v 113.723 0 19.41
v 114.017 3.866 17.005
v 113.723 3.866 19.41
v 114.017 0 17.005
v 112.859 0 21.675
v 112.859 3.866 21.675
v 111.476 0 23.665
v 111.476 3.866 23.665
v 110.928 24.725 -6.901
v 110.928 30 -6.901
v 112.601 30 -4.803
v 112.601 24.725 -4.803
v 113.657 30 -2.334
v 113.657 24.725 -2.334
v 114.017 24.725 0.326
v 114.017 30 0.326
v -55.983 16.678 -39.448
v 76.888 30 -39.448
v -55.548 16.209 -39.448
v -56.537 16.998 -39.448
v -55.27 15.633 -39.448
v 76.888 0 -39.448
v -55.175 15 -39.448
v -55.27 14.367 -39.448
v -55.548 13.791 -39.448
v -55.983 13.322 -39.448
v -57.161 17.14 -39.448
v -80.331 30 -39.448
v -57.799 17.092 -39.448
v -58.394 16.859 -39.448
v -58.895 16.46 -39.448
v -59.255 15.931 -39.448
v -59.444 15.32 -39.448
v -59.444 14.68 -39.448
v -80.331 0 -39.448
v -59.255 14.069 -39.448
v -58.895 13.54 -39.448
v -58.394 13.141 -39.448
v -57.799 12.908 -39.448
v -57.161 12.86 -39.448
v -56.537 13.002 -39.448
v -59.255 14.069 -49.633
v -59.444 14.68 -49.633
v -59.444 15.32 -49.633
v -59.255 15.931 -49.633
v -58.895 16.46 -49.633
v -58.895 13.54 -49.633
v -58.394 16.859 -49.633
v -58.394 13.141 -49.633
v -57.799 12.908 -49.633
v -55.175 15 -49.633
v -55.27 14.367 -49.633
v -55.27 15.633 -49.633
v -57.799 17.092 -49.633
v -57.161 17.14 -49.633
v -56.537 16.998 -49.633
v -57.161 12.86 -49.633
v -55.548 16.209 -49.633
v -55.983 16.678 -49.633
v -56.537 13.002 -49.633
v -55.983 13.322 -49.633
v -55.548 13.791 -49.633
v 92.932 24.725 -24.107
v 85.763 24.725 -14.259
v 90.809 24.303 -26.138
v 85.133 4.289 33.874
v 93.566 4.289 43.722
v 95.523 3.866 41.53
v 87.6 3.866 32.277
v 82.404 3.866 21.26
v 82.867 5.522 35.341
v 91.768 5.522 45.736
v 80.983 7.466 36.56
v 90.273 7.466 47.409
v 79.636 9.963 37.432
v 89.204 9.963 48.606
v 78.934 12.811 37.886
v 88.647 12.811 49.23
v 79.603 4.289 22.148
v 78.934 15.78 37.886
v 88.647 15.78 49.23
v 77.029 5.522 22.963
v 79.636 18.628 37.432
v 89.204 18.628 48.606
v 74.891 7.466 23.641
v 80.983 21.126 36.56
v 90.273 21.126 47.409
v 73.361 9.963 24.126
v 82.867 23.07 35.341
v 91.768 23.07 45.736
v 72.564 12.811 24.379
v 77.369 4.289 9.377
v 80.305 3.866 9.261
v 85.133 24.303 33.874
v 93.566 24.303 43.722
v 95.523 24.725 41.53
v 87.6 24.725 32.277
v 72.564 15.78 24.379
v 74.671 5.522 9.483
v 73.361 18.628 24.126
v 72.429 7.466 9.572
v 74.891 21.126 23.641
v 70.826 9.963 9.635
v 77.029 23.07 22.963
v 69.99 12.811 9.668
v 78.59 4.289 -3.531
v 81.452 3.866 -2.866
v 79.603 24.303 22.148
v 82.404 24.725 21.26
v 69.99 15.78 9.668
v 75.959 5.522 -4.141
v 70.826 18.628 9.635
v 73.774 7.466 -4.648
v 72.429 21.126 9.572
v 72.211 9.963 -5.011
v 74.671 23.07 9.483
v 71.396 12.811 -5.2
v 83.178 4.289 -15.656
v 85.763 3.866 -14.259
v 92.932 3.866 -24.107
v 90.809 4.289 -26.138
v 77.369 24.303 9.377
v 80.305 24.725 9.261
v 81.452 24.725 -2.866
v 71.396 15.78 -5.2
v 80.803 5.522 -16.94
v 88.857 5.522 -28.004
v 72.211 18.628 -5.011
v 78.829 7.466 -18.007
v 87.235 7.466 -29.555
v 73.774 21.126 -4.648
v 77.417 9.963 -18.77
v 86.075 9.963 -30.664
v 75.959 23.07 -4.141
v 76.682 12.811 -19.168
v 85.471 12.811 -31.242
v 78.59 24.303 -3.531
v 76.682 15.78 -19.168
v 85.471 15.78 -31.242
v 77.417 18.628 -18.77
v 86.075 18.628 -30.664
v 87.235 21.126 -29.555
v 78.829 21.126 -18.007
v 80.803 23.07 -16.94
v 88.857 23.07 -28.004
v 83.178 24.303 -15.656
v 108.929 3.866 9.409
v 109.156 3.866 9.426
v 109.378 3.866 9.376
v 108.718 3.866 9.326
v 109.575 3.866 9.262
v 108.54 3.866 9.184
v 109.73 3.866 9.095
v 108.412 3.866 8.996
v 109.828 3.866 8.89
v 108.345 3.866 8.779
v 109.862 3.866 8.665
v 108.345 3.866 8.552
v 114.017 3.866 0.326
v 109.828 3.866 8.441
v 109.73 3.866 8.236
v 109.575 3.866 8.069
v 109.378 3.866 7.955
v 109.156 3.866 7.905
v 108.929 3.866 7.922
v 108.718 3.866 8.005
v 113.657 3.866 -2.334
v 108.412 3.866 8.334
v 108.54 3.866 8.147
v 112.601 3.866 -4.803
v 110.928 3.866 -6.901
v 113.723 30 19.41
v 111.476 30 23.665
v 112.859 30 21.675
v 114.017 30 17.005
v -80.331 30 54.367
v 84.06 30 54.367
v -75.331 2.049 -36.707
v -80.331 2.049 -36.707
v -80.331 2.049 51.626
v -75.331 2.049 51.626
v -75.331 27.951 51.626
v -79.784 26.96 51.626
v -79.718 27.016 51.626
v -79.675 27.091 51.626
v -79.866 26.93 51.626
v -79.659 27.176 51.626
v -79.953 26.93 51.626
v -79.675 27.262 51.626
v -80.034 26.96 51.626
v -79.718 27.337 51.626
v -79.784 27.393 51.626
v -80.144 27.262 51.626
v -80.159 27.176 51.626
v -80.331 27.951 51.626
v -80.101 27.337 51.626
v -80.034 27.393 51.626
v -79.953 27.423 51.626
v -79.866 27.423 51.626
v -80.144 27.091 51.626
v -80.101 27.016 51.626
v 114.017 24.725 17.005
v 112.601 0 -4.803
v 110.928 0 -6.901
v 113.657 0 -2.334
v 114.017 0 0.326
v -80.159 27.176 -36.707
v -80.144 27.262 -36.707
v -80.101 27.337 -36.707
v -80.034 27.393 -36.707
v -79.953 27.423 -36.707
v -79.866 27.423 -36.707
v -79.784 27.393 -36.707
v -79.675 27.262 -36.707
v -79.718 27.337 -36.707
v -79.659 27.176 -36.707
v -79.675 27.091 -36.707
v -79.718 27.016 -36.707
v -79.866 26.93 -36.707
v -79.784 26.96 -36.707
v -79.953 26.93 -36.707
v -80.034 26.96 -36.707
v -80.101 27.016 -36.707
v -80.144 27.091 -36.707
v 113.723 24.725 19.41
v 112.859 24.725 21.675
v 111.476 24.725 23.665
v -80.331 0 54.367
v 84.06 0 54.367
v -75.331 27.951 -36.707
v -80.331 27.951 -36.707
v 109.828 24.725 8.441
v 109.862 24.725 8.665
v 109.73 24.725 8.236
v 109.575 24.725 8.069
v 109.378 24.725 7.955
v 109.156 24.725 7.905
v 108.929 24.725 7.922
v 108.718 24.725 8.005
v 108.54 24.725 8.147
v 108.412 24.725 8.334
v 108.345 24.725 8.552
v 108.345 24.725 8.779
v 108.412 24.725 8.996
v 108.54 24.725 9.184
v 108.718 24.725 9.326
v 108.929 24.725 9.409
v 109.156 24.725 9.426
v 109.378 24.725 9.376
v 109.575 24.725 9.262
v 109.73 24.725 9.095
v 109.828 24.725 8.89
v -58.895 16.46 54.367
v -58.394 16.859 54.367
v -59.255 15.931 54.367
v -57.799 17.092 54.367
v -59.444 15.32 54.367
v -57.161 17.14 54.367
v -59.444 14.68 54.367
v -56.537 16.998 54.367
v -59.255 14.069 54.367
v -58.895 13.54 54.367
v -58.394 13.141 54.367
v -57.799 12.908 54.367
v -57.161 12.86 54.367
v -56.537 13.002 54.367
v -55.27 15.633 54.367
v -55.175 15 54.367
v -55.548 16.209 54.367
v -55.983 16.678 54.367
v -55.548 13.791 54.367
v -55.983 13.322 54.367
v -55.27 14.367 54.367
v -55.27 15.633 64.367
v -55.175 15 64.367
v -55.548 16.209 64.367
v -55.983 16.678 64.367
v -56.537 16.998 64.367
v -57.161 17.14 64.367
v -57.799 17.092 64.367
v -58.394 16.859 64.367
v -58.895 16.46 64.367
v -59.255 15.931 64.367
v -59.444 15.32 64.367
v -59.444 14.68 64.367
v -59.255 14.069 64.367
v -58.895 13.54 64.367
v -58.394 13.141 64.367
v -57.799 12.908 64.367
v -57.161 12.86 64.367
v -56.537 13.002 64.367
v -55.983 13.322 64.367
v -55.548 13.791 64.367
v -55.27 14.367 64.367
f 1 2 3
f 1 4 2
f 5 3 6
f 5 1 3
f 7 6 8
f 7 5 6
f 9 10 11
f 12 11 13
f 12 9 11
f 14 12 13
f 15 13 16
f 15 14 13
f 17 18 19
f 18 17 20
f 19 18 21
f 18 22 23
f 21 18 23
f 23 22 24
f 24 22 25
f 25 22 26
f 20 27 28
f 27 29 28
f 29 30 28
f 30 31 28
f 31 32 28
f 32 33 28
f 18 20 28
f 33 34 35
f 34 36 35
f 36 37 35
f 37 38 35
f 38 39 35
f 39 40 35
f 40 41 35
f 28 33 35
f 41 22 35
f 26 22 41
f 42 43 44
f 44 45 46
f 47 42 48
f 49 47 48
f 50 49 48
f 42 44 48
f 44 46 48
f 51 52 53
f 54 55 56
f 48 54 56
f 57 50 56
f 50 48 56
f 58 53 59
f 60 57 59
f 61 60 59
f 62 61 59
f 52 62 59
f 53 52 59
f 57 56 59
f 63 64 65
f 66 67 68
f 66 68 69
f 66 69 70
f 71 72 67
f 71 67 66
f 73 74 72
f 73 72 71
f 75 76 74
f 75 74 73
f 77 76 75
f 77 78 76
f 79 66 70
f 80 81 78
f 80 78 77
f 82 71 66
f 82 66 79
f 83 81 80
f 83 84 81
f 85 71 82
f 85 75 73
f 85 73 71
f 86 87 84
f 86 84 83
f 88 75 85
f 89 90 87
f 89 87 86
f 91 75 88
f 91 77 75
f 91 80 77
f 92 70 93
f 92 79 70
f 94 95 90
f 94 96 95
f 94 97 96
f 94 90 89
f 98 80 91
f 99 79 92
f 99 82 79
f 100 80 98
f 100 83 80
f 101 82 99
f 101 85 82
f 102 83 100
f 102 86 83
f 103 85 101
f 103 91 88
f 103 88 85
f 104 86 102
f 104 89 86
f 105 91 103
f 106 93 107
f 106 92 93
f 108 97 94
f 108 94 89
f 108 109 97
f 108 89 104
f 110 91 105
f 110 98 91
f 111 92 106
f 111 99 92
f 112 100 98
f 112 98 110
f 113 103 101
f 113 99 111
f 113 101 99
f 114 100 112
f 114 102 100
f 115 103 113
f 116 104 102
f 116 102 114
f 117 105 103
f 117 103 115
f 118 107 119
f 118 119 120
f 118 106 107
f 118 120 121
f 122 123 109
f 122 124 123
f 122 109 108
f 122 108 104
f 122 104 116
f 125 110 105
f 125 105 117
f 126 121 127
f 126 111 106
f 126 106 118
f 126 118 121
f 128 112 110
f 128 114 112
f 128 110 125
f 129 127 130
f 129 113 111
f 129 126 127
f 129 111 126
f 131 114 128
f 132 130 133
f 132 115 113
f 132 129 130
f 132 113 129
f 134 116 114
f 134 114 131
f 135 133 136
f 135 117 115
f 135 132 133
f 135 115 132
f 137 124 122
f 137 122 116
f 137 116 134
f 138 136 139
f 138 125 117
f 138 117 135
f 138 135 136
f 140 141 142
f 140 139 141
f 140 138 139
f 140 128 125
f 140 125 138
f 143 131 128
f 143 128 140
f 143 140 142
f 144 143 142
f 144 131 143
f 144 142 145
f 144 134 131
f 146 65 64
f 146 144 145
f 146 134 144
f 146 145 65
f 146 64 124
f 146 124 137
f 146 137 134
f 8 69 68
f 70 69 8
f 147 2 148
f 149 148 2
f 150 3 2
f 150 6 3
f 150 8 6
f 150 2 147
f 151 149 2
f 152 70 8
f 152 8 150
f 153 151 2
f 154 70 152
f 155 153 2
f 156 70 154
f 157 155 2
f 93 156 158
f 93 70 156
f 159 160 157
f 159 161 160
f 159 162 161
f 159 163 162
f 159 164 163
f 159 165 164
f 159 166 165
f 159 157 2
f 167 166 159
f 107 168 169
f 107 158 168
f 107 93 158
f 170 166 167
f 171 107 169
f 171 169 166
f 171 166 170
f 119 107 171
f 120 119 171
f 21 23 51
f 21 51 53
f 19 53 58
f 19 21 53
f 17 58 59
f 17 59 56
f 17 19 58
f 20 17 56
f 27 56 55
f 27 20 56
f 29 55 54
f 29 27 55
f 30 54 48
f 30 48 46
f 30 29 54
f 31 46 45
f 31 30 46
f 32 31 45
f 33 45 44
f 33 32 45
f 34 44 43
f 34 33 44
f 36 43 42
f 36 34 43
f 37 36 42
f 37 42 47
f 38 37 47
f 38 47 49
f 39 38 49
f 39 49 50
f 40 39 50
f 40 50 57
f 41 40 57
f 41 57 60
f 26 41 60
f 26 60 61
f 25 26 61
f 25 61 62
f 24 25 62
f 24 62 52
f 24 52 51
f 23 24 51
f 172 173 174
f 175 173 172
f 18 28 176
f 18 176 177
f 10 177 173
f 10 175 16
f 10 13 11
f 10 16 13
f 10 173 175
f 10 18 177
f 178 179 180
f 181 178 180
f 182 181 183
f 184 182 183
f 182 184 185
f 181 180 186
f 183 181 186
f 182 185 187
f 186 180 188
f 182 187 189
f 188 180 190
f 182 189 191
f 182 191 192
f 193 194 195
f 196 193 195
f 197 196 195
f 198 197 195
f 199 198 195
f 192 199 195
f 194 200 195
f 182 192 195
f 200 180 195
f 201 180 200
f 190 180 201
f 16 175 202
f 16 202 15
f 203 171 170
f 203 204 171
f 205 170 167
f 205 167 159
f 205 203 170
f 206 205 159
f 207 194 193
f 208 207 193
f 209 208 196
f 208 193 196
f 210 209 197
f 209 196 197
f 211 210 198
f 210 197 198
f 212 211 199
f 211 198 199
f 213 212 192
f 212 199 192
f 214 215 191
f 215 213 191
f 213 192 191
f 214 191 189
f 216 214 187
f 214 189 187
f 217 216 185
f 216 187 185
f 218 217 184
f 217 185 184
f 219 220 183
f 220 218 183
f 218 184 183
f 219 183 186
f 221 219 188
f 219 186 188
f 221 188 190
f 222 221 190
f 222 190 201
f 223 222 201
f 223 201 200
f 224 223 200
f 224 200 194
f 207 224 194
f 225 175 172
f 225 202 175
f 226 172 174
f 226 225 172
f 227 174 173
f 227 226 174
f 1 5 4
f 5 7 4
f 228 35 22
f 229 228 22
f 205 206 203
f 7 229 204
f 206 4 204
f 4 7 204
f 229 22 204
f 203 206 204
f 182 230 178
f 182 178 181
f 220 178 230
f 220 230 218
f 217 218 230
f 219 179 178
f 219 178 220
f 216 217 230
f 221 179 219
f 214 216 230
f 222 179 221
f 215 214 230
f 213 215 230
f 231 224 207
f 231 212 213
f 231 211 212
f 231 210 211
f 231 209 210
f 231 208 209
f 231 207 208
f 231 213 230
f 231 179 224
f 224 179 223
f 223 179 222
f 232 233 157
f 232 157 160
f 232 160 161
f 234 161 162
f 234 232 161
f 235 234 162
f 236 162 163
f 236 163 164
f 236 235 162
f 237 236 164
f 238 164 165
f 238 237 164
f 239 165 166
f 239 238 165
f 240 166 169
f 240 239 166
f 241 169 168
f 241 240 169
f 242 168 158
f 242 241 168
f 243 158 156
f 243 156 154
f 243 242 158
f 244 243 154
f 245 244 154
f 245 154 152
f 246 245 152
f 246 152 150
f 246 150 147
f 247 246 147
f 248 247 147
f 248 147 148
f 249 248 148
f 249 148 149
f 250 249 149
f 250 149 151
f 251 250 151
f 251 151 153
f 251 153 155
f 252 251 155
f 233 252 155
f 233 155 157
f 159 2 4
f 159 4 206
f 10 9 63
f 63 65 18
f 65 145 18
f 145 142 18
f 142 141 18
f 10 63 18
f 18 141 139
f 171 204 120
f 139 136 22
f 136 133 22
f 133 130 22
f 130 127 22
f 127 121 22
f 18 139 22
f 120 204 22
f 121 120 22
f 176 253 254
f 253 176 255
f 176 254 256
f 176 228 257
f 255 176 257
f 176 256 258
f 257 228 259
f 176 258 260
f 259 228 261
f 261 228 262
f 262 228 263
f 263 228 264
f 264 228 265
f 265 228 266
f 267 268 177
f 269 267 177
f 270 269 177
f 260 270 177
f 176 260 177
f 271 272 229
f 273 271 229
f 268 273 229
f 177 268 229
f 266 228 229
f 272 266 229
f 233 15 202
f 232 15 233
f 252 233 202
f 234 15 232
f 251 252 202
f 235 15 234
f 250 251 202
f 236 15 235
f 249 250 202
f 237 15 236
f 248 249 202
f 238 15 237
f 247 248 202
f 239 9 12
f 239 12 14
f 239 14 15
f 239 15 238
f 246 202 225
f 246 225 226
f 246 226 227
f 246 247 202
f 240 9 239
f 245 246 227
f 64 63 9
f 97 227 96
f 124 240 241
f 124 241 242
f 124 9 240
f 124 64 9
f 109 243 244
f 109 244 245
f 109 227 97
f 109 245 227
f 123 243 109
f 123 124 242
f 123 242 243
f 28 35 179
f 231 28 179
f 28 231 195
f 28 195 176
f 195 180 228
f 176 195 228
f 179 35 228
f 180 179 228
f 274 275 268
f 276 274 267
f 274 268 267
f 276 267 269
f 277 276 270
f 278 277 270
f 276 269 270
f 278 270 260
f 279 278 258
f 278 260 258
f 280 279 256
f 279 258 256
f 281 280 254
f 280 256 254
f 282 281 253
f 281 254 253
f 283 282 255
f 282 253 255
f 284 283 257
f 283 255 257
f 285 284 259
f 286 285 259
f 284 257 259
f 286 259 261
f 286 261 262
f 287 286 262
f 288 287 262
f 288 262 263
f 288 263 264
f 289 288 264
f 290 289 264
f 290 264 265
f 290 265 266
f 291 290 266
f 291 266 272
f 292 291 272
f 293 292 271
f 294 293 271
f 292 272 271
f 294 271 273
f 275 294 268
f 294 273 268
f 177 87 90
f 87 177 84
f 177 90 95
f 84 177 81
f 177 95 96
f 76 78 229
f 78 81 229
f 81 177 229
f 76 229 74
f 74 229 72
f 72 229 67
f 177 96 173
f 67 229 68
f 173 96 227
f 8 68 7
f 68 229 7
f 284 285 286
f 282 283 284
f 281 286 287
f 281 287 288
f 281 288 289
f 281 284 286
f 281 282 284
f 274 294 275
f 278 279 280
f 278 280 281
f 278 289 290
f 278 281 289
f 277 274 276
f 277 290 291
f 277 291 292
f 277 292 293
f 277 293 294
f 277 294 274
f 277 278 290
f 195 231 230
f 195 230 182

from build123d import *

# Parameters (mm, degrees)
BOSS_EXTRUDE1_DEPTH      = 30
SKETCH3_R                = 2.146244949
BOSS_EXTRUDE2_DEPTH      = 10
BOSS_EXTRUDE2_DEPTH_BACK = 104
SKETCH4_W                = 62.472603167
SKETCH4_H                = 24.76734243
CUT_EXTRUDE1_DEPTH       = 31
FILLET1_R                = 10
SKETCH5_R                = 0.76292284
BOSS_EXTRUDE3_DEPTH      = 30
SKETCH8_W                = 88.333137
SKETCH8_H                = 25.902143048
CUT_EXTRUDE2_DEPTH       = 5
SKETCH9_R                = 0.25
BOSS_EXTRUDE4_DEPTH      = 90


with BuildPart() as part:
    # Sketch1 → Boss-Extrude1 (new body)
    with BuildSketch(Plane(origin=(0, 0, 0), x_dir=(1, 0, 0), z_dir=(0, 1, 0))):
        Polygon((-80.330769327, 39.448145651), (-80.330769327, -54.366717098), (84.060412188, -54.366717098), (125.94717048, -7.459285723), (76.88802207, 39.448145651), align=None)
    extrude(amount=BOSS_EXTRUDE1_DEPTH)

    # Sketch2 → Cut-Revolve2 (revolve, cut)
    with BuildSketch(Plane(origin=(73.778167937, 0, 65.881422133), x_dir=(0.666061097, 0, -0.745897188), z_dir=(0.745897188, 0, 0.666061097))):
        with BuildLine():
            Line((32.647209403, 24.725169295), (66.605654017, 24.725169295))
            ThreePointArc((66.605654017, 24.725169295), (77.035151749, 14.295671563), (66.605654017, 3.866173832))
            Line((66.605654017, 3.866173832), (32.647209403, 3.866173832))
            ThreePointArc((32.647209403, 3.866173832), (22.217711672, 14.295671563), (32.647209403, 24.725169295))
        make_face()
    revolve(axis=Axis((125.94717048, 30, 7.459285723), (0, -1, 0)), mode=Mode.SUBTRACT)

    # Sketch3 → Boss-Extrude2 (add, two sides)
    with BuildSketch(Plane.XY.offset(54.366717098)) as boss_extrude2_sk:
        with Locations((-57.321321229, 15)):
            Circle(SKETCH3_R)
    extrude(amount=BOSS_EXTRUDE2_DEPTH)
    extrude(boss_extrude2_sk.sketch, amount=-BOSS_EXTRUDE2_DEPTH_BACK)

    # Sketch4 → Cut-Extrude1 (cut, through all)
    with BuildSketch(Plane(origin=(0, 30, 0), x_dir=(1, 0, 0), z_dir=(0, 1, 0))):
        with Locations((145.25317231, -8.435915945)):
            Rectangle(SKETCH4_W, SKETCH4_H)
    extrude(amount=-CUT_EXTRUDE1_DEPTH, mode=Mode.SUBTRACT)

    # Fillet1
    fillet1_edges = [part.edges().sort_by_distance(p)[0] for p in [
        (114.016870726, 1.933086916, 20.81958716),
        (114.016870726, 27.362584647, 20.81958716),
        (114.016870726, 1.933086916, -3.94775527),
        (114.016870726, 27.362584647, -3.94775527),
    ]]
    fillet(fillet1_edges, radius=FILLET1_R)

    # Sketch5 → Boss-Extrude3 (add)
    with BuildSketch(Plane(origin=(0, 30, 0), x_dir=(1, 0, 0), z_dir=(0, 1, 0))):
        with Locations((109.099187599, -8.665449149)):
            Circle(SKETCH5_R)
    extrude(amount=-BOSS_EXTRUDE3_DEPTH)

    # Sketch8 → Cut-Extrude2 (cut)
    with BuildSketch(Plane.ZY.offset(80.330769327)):
        with Locations((7.459285723, 15)):
            Rectangle(SKETCH8_W, SKETCH8_H)
    extrude(amount=-CUT_EXTRUDE2_DEPTH, mode=Mode.SUBTRACT)

    # Sketch9 → Boss-Extrude4 (add)
    with BuildSketch(Plane(origin=(0, 0, 51.625854223), x_dir=(-1, 0, 0), z_dir=(0, 0, -1))):
        with Locations((79.909462448, 27.17643451)):
            Circle(SKETCH9_R)
    extrude(amount=BOSS_EXTRUDE4_DEPTH)


solid = part.part
